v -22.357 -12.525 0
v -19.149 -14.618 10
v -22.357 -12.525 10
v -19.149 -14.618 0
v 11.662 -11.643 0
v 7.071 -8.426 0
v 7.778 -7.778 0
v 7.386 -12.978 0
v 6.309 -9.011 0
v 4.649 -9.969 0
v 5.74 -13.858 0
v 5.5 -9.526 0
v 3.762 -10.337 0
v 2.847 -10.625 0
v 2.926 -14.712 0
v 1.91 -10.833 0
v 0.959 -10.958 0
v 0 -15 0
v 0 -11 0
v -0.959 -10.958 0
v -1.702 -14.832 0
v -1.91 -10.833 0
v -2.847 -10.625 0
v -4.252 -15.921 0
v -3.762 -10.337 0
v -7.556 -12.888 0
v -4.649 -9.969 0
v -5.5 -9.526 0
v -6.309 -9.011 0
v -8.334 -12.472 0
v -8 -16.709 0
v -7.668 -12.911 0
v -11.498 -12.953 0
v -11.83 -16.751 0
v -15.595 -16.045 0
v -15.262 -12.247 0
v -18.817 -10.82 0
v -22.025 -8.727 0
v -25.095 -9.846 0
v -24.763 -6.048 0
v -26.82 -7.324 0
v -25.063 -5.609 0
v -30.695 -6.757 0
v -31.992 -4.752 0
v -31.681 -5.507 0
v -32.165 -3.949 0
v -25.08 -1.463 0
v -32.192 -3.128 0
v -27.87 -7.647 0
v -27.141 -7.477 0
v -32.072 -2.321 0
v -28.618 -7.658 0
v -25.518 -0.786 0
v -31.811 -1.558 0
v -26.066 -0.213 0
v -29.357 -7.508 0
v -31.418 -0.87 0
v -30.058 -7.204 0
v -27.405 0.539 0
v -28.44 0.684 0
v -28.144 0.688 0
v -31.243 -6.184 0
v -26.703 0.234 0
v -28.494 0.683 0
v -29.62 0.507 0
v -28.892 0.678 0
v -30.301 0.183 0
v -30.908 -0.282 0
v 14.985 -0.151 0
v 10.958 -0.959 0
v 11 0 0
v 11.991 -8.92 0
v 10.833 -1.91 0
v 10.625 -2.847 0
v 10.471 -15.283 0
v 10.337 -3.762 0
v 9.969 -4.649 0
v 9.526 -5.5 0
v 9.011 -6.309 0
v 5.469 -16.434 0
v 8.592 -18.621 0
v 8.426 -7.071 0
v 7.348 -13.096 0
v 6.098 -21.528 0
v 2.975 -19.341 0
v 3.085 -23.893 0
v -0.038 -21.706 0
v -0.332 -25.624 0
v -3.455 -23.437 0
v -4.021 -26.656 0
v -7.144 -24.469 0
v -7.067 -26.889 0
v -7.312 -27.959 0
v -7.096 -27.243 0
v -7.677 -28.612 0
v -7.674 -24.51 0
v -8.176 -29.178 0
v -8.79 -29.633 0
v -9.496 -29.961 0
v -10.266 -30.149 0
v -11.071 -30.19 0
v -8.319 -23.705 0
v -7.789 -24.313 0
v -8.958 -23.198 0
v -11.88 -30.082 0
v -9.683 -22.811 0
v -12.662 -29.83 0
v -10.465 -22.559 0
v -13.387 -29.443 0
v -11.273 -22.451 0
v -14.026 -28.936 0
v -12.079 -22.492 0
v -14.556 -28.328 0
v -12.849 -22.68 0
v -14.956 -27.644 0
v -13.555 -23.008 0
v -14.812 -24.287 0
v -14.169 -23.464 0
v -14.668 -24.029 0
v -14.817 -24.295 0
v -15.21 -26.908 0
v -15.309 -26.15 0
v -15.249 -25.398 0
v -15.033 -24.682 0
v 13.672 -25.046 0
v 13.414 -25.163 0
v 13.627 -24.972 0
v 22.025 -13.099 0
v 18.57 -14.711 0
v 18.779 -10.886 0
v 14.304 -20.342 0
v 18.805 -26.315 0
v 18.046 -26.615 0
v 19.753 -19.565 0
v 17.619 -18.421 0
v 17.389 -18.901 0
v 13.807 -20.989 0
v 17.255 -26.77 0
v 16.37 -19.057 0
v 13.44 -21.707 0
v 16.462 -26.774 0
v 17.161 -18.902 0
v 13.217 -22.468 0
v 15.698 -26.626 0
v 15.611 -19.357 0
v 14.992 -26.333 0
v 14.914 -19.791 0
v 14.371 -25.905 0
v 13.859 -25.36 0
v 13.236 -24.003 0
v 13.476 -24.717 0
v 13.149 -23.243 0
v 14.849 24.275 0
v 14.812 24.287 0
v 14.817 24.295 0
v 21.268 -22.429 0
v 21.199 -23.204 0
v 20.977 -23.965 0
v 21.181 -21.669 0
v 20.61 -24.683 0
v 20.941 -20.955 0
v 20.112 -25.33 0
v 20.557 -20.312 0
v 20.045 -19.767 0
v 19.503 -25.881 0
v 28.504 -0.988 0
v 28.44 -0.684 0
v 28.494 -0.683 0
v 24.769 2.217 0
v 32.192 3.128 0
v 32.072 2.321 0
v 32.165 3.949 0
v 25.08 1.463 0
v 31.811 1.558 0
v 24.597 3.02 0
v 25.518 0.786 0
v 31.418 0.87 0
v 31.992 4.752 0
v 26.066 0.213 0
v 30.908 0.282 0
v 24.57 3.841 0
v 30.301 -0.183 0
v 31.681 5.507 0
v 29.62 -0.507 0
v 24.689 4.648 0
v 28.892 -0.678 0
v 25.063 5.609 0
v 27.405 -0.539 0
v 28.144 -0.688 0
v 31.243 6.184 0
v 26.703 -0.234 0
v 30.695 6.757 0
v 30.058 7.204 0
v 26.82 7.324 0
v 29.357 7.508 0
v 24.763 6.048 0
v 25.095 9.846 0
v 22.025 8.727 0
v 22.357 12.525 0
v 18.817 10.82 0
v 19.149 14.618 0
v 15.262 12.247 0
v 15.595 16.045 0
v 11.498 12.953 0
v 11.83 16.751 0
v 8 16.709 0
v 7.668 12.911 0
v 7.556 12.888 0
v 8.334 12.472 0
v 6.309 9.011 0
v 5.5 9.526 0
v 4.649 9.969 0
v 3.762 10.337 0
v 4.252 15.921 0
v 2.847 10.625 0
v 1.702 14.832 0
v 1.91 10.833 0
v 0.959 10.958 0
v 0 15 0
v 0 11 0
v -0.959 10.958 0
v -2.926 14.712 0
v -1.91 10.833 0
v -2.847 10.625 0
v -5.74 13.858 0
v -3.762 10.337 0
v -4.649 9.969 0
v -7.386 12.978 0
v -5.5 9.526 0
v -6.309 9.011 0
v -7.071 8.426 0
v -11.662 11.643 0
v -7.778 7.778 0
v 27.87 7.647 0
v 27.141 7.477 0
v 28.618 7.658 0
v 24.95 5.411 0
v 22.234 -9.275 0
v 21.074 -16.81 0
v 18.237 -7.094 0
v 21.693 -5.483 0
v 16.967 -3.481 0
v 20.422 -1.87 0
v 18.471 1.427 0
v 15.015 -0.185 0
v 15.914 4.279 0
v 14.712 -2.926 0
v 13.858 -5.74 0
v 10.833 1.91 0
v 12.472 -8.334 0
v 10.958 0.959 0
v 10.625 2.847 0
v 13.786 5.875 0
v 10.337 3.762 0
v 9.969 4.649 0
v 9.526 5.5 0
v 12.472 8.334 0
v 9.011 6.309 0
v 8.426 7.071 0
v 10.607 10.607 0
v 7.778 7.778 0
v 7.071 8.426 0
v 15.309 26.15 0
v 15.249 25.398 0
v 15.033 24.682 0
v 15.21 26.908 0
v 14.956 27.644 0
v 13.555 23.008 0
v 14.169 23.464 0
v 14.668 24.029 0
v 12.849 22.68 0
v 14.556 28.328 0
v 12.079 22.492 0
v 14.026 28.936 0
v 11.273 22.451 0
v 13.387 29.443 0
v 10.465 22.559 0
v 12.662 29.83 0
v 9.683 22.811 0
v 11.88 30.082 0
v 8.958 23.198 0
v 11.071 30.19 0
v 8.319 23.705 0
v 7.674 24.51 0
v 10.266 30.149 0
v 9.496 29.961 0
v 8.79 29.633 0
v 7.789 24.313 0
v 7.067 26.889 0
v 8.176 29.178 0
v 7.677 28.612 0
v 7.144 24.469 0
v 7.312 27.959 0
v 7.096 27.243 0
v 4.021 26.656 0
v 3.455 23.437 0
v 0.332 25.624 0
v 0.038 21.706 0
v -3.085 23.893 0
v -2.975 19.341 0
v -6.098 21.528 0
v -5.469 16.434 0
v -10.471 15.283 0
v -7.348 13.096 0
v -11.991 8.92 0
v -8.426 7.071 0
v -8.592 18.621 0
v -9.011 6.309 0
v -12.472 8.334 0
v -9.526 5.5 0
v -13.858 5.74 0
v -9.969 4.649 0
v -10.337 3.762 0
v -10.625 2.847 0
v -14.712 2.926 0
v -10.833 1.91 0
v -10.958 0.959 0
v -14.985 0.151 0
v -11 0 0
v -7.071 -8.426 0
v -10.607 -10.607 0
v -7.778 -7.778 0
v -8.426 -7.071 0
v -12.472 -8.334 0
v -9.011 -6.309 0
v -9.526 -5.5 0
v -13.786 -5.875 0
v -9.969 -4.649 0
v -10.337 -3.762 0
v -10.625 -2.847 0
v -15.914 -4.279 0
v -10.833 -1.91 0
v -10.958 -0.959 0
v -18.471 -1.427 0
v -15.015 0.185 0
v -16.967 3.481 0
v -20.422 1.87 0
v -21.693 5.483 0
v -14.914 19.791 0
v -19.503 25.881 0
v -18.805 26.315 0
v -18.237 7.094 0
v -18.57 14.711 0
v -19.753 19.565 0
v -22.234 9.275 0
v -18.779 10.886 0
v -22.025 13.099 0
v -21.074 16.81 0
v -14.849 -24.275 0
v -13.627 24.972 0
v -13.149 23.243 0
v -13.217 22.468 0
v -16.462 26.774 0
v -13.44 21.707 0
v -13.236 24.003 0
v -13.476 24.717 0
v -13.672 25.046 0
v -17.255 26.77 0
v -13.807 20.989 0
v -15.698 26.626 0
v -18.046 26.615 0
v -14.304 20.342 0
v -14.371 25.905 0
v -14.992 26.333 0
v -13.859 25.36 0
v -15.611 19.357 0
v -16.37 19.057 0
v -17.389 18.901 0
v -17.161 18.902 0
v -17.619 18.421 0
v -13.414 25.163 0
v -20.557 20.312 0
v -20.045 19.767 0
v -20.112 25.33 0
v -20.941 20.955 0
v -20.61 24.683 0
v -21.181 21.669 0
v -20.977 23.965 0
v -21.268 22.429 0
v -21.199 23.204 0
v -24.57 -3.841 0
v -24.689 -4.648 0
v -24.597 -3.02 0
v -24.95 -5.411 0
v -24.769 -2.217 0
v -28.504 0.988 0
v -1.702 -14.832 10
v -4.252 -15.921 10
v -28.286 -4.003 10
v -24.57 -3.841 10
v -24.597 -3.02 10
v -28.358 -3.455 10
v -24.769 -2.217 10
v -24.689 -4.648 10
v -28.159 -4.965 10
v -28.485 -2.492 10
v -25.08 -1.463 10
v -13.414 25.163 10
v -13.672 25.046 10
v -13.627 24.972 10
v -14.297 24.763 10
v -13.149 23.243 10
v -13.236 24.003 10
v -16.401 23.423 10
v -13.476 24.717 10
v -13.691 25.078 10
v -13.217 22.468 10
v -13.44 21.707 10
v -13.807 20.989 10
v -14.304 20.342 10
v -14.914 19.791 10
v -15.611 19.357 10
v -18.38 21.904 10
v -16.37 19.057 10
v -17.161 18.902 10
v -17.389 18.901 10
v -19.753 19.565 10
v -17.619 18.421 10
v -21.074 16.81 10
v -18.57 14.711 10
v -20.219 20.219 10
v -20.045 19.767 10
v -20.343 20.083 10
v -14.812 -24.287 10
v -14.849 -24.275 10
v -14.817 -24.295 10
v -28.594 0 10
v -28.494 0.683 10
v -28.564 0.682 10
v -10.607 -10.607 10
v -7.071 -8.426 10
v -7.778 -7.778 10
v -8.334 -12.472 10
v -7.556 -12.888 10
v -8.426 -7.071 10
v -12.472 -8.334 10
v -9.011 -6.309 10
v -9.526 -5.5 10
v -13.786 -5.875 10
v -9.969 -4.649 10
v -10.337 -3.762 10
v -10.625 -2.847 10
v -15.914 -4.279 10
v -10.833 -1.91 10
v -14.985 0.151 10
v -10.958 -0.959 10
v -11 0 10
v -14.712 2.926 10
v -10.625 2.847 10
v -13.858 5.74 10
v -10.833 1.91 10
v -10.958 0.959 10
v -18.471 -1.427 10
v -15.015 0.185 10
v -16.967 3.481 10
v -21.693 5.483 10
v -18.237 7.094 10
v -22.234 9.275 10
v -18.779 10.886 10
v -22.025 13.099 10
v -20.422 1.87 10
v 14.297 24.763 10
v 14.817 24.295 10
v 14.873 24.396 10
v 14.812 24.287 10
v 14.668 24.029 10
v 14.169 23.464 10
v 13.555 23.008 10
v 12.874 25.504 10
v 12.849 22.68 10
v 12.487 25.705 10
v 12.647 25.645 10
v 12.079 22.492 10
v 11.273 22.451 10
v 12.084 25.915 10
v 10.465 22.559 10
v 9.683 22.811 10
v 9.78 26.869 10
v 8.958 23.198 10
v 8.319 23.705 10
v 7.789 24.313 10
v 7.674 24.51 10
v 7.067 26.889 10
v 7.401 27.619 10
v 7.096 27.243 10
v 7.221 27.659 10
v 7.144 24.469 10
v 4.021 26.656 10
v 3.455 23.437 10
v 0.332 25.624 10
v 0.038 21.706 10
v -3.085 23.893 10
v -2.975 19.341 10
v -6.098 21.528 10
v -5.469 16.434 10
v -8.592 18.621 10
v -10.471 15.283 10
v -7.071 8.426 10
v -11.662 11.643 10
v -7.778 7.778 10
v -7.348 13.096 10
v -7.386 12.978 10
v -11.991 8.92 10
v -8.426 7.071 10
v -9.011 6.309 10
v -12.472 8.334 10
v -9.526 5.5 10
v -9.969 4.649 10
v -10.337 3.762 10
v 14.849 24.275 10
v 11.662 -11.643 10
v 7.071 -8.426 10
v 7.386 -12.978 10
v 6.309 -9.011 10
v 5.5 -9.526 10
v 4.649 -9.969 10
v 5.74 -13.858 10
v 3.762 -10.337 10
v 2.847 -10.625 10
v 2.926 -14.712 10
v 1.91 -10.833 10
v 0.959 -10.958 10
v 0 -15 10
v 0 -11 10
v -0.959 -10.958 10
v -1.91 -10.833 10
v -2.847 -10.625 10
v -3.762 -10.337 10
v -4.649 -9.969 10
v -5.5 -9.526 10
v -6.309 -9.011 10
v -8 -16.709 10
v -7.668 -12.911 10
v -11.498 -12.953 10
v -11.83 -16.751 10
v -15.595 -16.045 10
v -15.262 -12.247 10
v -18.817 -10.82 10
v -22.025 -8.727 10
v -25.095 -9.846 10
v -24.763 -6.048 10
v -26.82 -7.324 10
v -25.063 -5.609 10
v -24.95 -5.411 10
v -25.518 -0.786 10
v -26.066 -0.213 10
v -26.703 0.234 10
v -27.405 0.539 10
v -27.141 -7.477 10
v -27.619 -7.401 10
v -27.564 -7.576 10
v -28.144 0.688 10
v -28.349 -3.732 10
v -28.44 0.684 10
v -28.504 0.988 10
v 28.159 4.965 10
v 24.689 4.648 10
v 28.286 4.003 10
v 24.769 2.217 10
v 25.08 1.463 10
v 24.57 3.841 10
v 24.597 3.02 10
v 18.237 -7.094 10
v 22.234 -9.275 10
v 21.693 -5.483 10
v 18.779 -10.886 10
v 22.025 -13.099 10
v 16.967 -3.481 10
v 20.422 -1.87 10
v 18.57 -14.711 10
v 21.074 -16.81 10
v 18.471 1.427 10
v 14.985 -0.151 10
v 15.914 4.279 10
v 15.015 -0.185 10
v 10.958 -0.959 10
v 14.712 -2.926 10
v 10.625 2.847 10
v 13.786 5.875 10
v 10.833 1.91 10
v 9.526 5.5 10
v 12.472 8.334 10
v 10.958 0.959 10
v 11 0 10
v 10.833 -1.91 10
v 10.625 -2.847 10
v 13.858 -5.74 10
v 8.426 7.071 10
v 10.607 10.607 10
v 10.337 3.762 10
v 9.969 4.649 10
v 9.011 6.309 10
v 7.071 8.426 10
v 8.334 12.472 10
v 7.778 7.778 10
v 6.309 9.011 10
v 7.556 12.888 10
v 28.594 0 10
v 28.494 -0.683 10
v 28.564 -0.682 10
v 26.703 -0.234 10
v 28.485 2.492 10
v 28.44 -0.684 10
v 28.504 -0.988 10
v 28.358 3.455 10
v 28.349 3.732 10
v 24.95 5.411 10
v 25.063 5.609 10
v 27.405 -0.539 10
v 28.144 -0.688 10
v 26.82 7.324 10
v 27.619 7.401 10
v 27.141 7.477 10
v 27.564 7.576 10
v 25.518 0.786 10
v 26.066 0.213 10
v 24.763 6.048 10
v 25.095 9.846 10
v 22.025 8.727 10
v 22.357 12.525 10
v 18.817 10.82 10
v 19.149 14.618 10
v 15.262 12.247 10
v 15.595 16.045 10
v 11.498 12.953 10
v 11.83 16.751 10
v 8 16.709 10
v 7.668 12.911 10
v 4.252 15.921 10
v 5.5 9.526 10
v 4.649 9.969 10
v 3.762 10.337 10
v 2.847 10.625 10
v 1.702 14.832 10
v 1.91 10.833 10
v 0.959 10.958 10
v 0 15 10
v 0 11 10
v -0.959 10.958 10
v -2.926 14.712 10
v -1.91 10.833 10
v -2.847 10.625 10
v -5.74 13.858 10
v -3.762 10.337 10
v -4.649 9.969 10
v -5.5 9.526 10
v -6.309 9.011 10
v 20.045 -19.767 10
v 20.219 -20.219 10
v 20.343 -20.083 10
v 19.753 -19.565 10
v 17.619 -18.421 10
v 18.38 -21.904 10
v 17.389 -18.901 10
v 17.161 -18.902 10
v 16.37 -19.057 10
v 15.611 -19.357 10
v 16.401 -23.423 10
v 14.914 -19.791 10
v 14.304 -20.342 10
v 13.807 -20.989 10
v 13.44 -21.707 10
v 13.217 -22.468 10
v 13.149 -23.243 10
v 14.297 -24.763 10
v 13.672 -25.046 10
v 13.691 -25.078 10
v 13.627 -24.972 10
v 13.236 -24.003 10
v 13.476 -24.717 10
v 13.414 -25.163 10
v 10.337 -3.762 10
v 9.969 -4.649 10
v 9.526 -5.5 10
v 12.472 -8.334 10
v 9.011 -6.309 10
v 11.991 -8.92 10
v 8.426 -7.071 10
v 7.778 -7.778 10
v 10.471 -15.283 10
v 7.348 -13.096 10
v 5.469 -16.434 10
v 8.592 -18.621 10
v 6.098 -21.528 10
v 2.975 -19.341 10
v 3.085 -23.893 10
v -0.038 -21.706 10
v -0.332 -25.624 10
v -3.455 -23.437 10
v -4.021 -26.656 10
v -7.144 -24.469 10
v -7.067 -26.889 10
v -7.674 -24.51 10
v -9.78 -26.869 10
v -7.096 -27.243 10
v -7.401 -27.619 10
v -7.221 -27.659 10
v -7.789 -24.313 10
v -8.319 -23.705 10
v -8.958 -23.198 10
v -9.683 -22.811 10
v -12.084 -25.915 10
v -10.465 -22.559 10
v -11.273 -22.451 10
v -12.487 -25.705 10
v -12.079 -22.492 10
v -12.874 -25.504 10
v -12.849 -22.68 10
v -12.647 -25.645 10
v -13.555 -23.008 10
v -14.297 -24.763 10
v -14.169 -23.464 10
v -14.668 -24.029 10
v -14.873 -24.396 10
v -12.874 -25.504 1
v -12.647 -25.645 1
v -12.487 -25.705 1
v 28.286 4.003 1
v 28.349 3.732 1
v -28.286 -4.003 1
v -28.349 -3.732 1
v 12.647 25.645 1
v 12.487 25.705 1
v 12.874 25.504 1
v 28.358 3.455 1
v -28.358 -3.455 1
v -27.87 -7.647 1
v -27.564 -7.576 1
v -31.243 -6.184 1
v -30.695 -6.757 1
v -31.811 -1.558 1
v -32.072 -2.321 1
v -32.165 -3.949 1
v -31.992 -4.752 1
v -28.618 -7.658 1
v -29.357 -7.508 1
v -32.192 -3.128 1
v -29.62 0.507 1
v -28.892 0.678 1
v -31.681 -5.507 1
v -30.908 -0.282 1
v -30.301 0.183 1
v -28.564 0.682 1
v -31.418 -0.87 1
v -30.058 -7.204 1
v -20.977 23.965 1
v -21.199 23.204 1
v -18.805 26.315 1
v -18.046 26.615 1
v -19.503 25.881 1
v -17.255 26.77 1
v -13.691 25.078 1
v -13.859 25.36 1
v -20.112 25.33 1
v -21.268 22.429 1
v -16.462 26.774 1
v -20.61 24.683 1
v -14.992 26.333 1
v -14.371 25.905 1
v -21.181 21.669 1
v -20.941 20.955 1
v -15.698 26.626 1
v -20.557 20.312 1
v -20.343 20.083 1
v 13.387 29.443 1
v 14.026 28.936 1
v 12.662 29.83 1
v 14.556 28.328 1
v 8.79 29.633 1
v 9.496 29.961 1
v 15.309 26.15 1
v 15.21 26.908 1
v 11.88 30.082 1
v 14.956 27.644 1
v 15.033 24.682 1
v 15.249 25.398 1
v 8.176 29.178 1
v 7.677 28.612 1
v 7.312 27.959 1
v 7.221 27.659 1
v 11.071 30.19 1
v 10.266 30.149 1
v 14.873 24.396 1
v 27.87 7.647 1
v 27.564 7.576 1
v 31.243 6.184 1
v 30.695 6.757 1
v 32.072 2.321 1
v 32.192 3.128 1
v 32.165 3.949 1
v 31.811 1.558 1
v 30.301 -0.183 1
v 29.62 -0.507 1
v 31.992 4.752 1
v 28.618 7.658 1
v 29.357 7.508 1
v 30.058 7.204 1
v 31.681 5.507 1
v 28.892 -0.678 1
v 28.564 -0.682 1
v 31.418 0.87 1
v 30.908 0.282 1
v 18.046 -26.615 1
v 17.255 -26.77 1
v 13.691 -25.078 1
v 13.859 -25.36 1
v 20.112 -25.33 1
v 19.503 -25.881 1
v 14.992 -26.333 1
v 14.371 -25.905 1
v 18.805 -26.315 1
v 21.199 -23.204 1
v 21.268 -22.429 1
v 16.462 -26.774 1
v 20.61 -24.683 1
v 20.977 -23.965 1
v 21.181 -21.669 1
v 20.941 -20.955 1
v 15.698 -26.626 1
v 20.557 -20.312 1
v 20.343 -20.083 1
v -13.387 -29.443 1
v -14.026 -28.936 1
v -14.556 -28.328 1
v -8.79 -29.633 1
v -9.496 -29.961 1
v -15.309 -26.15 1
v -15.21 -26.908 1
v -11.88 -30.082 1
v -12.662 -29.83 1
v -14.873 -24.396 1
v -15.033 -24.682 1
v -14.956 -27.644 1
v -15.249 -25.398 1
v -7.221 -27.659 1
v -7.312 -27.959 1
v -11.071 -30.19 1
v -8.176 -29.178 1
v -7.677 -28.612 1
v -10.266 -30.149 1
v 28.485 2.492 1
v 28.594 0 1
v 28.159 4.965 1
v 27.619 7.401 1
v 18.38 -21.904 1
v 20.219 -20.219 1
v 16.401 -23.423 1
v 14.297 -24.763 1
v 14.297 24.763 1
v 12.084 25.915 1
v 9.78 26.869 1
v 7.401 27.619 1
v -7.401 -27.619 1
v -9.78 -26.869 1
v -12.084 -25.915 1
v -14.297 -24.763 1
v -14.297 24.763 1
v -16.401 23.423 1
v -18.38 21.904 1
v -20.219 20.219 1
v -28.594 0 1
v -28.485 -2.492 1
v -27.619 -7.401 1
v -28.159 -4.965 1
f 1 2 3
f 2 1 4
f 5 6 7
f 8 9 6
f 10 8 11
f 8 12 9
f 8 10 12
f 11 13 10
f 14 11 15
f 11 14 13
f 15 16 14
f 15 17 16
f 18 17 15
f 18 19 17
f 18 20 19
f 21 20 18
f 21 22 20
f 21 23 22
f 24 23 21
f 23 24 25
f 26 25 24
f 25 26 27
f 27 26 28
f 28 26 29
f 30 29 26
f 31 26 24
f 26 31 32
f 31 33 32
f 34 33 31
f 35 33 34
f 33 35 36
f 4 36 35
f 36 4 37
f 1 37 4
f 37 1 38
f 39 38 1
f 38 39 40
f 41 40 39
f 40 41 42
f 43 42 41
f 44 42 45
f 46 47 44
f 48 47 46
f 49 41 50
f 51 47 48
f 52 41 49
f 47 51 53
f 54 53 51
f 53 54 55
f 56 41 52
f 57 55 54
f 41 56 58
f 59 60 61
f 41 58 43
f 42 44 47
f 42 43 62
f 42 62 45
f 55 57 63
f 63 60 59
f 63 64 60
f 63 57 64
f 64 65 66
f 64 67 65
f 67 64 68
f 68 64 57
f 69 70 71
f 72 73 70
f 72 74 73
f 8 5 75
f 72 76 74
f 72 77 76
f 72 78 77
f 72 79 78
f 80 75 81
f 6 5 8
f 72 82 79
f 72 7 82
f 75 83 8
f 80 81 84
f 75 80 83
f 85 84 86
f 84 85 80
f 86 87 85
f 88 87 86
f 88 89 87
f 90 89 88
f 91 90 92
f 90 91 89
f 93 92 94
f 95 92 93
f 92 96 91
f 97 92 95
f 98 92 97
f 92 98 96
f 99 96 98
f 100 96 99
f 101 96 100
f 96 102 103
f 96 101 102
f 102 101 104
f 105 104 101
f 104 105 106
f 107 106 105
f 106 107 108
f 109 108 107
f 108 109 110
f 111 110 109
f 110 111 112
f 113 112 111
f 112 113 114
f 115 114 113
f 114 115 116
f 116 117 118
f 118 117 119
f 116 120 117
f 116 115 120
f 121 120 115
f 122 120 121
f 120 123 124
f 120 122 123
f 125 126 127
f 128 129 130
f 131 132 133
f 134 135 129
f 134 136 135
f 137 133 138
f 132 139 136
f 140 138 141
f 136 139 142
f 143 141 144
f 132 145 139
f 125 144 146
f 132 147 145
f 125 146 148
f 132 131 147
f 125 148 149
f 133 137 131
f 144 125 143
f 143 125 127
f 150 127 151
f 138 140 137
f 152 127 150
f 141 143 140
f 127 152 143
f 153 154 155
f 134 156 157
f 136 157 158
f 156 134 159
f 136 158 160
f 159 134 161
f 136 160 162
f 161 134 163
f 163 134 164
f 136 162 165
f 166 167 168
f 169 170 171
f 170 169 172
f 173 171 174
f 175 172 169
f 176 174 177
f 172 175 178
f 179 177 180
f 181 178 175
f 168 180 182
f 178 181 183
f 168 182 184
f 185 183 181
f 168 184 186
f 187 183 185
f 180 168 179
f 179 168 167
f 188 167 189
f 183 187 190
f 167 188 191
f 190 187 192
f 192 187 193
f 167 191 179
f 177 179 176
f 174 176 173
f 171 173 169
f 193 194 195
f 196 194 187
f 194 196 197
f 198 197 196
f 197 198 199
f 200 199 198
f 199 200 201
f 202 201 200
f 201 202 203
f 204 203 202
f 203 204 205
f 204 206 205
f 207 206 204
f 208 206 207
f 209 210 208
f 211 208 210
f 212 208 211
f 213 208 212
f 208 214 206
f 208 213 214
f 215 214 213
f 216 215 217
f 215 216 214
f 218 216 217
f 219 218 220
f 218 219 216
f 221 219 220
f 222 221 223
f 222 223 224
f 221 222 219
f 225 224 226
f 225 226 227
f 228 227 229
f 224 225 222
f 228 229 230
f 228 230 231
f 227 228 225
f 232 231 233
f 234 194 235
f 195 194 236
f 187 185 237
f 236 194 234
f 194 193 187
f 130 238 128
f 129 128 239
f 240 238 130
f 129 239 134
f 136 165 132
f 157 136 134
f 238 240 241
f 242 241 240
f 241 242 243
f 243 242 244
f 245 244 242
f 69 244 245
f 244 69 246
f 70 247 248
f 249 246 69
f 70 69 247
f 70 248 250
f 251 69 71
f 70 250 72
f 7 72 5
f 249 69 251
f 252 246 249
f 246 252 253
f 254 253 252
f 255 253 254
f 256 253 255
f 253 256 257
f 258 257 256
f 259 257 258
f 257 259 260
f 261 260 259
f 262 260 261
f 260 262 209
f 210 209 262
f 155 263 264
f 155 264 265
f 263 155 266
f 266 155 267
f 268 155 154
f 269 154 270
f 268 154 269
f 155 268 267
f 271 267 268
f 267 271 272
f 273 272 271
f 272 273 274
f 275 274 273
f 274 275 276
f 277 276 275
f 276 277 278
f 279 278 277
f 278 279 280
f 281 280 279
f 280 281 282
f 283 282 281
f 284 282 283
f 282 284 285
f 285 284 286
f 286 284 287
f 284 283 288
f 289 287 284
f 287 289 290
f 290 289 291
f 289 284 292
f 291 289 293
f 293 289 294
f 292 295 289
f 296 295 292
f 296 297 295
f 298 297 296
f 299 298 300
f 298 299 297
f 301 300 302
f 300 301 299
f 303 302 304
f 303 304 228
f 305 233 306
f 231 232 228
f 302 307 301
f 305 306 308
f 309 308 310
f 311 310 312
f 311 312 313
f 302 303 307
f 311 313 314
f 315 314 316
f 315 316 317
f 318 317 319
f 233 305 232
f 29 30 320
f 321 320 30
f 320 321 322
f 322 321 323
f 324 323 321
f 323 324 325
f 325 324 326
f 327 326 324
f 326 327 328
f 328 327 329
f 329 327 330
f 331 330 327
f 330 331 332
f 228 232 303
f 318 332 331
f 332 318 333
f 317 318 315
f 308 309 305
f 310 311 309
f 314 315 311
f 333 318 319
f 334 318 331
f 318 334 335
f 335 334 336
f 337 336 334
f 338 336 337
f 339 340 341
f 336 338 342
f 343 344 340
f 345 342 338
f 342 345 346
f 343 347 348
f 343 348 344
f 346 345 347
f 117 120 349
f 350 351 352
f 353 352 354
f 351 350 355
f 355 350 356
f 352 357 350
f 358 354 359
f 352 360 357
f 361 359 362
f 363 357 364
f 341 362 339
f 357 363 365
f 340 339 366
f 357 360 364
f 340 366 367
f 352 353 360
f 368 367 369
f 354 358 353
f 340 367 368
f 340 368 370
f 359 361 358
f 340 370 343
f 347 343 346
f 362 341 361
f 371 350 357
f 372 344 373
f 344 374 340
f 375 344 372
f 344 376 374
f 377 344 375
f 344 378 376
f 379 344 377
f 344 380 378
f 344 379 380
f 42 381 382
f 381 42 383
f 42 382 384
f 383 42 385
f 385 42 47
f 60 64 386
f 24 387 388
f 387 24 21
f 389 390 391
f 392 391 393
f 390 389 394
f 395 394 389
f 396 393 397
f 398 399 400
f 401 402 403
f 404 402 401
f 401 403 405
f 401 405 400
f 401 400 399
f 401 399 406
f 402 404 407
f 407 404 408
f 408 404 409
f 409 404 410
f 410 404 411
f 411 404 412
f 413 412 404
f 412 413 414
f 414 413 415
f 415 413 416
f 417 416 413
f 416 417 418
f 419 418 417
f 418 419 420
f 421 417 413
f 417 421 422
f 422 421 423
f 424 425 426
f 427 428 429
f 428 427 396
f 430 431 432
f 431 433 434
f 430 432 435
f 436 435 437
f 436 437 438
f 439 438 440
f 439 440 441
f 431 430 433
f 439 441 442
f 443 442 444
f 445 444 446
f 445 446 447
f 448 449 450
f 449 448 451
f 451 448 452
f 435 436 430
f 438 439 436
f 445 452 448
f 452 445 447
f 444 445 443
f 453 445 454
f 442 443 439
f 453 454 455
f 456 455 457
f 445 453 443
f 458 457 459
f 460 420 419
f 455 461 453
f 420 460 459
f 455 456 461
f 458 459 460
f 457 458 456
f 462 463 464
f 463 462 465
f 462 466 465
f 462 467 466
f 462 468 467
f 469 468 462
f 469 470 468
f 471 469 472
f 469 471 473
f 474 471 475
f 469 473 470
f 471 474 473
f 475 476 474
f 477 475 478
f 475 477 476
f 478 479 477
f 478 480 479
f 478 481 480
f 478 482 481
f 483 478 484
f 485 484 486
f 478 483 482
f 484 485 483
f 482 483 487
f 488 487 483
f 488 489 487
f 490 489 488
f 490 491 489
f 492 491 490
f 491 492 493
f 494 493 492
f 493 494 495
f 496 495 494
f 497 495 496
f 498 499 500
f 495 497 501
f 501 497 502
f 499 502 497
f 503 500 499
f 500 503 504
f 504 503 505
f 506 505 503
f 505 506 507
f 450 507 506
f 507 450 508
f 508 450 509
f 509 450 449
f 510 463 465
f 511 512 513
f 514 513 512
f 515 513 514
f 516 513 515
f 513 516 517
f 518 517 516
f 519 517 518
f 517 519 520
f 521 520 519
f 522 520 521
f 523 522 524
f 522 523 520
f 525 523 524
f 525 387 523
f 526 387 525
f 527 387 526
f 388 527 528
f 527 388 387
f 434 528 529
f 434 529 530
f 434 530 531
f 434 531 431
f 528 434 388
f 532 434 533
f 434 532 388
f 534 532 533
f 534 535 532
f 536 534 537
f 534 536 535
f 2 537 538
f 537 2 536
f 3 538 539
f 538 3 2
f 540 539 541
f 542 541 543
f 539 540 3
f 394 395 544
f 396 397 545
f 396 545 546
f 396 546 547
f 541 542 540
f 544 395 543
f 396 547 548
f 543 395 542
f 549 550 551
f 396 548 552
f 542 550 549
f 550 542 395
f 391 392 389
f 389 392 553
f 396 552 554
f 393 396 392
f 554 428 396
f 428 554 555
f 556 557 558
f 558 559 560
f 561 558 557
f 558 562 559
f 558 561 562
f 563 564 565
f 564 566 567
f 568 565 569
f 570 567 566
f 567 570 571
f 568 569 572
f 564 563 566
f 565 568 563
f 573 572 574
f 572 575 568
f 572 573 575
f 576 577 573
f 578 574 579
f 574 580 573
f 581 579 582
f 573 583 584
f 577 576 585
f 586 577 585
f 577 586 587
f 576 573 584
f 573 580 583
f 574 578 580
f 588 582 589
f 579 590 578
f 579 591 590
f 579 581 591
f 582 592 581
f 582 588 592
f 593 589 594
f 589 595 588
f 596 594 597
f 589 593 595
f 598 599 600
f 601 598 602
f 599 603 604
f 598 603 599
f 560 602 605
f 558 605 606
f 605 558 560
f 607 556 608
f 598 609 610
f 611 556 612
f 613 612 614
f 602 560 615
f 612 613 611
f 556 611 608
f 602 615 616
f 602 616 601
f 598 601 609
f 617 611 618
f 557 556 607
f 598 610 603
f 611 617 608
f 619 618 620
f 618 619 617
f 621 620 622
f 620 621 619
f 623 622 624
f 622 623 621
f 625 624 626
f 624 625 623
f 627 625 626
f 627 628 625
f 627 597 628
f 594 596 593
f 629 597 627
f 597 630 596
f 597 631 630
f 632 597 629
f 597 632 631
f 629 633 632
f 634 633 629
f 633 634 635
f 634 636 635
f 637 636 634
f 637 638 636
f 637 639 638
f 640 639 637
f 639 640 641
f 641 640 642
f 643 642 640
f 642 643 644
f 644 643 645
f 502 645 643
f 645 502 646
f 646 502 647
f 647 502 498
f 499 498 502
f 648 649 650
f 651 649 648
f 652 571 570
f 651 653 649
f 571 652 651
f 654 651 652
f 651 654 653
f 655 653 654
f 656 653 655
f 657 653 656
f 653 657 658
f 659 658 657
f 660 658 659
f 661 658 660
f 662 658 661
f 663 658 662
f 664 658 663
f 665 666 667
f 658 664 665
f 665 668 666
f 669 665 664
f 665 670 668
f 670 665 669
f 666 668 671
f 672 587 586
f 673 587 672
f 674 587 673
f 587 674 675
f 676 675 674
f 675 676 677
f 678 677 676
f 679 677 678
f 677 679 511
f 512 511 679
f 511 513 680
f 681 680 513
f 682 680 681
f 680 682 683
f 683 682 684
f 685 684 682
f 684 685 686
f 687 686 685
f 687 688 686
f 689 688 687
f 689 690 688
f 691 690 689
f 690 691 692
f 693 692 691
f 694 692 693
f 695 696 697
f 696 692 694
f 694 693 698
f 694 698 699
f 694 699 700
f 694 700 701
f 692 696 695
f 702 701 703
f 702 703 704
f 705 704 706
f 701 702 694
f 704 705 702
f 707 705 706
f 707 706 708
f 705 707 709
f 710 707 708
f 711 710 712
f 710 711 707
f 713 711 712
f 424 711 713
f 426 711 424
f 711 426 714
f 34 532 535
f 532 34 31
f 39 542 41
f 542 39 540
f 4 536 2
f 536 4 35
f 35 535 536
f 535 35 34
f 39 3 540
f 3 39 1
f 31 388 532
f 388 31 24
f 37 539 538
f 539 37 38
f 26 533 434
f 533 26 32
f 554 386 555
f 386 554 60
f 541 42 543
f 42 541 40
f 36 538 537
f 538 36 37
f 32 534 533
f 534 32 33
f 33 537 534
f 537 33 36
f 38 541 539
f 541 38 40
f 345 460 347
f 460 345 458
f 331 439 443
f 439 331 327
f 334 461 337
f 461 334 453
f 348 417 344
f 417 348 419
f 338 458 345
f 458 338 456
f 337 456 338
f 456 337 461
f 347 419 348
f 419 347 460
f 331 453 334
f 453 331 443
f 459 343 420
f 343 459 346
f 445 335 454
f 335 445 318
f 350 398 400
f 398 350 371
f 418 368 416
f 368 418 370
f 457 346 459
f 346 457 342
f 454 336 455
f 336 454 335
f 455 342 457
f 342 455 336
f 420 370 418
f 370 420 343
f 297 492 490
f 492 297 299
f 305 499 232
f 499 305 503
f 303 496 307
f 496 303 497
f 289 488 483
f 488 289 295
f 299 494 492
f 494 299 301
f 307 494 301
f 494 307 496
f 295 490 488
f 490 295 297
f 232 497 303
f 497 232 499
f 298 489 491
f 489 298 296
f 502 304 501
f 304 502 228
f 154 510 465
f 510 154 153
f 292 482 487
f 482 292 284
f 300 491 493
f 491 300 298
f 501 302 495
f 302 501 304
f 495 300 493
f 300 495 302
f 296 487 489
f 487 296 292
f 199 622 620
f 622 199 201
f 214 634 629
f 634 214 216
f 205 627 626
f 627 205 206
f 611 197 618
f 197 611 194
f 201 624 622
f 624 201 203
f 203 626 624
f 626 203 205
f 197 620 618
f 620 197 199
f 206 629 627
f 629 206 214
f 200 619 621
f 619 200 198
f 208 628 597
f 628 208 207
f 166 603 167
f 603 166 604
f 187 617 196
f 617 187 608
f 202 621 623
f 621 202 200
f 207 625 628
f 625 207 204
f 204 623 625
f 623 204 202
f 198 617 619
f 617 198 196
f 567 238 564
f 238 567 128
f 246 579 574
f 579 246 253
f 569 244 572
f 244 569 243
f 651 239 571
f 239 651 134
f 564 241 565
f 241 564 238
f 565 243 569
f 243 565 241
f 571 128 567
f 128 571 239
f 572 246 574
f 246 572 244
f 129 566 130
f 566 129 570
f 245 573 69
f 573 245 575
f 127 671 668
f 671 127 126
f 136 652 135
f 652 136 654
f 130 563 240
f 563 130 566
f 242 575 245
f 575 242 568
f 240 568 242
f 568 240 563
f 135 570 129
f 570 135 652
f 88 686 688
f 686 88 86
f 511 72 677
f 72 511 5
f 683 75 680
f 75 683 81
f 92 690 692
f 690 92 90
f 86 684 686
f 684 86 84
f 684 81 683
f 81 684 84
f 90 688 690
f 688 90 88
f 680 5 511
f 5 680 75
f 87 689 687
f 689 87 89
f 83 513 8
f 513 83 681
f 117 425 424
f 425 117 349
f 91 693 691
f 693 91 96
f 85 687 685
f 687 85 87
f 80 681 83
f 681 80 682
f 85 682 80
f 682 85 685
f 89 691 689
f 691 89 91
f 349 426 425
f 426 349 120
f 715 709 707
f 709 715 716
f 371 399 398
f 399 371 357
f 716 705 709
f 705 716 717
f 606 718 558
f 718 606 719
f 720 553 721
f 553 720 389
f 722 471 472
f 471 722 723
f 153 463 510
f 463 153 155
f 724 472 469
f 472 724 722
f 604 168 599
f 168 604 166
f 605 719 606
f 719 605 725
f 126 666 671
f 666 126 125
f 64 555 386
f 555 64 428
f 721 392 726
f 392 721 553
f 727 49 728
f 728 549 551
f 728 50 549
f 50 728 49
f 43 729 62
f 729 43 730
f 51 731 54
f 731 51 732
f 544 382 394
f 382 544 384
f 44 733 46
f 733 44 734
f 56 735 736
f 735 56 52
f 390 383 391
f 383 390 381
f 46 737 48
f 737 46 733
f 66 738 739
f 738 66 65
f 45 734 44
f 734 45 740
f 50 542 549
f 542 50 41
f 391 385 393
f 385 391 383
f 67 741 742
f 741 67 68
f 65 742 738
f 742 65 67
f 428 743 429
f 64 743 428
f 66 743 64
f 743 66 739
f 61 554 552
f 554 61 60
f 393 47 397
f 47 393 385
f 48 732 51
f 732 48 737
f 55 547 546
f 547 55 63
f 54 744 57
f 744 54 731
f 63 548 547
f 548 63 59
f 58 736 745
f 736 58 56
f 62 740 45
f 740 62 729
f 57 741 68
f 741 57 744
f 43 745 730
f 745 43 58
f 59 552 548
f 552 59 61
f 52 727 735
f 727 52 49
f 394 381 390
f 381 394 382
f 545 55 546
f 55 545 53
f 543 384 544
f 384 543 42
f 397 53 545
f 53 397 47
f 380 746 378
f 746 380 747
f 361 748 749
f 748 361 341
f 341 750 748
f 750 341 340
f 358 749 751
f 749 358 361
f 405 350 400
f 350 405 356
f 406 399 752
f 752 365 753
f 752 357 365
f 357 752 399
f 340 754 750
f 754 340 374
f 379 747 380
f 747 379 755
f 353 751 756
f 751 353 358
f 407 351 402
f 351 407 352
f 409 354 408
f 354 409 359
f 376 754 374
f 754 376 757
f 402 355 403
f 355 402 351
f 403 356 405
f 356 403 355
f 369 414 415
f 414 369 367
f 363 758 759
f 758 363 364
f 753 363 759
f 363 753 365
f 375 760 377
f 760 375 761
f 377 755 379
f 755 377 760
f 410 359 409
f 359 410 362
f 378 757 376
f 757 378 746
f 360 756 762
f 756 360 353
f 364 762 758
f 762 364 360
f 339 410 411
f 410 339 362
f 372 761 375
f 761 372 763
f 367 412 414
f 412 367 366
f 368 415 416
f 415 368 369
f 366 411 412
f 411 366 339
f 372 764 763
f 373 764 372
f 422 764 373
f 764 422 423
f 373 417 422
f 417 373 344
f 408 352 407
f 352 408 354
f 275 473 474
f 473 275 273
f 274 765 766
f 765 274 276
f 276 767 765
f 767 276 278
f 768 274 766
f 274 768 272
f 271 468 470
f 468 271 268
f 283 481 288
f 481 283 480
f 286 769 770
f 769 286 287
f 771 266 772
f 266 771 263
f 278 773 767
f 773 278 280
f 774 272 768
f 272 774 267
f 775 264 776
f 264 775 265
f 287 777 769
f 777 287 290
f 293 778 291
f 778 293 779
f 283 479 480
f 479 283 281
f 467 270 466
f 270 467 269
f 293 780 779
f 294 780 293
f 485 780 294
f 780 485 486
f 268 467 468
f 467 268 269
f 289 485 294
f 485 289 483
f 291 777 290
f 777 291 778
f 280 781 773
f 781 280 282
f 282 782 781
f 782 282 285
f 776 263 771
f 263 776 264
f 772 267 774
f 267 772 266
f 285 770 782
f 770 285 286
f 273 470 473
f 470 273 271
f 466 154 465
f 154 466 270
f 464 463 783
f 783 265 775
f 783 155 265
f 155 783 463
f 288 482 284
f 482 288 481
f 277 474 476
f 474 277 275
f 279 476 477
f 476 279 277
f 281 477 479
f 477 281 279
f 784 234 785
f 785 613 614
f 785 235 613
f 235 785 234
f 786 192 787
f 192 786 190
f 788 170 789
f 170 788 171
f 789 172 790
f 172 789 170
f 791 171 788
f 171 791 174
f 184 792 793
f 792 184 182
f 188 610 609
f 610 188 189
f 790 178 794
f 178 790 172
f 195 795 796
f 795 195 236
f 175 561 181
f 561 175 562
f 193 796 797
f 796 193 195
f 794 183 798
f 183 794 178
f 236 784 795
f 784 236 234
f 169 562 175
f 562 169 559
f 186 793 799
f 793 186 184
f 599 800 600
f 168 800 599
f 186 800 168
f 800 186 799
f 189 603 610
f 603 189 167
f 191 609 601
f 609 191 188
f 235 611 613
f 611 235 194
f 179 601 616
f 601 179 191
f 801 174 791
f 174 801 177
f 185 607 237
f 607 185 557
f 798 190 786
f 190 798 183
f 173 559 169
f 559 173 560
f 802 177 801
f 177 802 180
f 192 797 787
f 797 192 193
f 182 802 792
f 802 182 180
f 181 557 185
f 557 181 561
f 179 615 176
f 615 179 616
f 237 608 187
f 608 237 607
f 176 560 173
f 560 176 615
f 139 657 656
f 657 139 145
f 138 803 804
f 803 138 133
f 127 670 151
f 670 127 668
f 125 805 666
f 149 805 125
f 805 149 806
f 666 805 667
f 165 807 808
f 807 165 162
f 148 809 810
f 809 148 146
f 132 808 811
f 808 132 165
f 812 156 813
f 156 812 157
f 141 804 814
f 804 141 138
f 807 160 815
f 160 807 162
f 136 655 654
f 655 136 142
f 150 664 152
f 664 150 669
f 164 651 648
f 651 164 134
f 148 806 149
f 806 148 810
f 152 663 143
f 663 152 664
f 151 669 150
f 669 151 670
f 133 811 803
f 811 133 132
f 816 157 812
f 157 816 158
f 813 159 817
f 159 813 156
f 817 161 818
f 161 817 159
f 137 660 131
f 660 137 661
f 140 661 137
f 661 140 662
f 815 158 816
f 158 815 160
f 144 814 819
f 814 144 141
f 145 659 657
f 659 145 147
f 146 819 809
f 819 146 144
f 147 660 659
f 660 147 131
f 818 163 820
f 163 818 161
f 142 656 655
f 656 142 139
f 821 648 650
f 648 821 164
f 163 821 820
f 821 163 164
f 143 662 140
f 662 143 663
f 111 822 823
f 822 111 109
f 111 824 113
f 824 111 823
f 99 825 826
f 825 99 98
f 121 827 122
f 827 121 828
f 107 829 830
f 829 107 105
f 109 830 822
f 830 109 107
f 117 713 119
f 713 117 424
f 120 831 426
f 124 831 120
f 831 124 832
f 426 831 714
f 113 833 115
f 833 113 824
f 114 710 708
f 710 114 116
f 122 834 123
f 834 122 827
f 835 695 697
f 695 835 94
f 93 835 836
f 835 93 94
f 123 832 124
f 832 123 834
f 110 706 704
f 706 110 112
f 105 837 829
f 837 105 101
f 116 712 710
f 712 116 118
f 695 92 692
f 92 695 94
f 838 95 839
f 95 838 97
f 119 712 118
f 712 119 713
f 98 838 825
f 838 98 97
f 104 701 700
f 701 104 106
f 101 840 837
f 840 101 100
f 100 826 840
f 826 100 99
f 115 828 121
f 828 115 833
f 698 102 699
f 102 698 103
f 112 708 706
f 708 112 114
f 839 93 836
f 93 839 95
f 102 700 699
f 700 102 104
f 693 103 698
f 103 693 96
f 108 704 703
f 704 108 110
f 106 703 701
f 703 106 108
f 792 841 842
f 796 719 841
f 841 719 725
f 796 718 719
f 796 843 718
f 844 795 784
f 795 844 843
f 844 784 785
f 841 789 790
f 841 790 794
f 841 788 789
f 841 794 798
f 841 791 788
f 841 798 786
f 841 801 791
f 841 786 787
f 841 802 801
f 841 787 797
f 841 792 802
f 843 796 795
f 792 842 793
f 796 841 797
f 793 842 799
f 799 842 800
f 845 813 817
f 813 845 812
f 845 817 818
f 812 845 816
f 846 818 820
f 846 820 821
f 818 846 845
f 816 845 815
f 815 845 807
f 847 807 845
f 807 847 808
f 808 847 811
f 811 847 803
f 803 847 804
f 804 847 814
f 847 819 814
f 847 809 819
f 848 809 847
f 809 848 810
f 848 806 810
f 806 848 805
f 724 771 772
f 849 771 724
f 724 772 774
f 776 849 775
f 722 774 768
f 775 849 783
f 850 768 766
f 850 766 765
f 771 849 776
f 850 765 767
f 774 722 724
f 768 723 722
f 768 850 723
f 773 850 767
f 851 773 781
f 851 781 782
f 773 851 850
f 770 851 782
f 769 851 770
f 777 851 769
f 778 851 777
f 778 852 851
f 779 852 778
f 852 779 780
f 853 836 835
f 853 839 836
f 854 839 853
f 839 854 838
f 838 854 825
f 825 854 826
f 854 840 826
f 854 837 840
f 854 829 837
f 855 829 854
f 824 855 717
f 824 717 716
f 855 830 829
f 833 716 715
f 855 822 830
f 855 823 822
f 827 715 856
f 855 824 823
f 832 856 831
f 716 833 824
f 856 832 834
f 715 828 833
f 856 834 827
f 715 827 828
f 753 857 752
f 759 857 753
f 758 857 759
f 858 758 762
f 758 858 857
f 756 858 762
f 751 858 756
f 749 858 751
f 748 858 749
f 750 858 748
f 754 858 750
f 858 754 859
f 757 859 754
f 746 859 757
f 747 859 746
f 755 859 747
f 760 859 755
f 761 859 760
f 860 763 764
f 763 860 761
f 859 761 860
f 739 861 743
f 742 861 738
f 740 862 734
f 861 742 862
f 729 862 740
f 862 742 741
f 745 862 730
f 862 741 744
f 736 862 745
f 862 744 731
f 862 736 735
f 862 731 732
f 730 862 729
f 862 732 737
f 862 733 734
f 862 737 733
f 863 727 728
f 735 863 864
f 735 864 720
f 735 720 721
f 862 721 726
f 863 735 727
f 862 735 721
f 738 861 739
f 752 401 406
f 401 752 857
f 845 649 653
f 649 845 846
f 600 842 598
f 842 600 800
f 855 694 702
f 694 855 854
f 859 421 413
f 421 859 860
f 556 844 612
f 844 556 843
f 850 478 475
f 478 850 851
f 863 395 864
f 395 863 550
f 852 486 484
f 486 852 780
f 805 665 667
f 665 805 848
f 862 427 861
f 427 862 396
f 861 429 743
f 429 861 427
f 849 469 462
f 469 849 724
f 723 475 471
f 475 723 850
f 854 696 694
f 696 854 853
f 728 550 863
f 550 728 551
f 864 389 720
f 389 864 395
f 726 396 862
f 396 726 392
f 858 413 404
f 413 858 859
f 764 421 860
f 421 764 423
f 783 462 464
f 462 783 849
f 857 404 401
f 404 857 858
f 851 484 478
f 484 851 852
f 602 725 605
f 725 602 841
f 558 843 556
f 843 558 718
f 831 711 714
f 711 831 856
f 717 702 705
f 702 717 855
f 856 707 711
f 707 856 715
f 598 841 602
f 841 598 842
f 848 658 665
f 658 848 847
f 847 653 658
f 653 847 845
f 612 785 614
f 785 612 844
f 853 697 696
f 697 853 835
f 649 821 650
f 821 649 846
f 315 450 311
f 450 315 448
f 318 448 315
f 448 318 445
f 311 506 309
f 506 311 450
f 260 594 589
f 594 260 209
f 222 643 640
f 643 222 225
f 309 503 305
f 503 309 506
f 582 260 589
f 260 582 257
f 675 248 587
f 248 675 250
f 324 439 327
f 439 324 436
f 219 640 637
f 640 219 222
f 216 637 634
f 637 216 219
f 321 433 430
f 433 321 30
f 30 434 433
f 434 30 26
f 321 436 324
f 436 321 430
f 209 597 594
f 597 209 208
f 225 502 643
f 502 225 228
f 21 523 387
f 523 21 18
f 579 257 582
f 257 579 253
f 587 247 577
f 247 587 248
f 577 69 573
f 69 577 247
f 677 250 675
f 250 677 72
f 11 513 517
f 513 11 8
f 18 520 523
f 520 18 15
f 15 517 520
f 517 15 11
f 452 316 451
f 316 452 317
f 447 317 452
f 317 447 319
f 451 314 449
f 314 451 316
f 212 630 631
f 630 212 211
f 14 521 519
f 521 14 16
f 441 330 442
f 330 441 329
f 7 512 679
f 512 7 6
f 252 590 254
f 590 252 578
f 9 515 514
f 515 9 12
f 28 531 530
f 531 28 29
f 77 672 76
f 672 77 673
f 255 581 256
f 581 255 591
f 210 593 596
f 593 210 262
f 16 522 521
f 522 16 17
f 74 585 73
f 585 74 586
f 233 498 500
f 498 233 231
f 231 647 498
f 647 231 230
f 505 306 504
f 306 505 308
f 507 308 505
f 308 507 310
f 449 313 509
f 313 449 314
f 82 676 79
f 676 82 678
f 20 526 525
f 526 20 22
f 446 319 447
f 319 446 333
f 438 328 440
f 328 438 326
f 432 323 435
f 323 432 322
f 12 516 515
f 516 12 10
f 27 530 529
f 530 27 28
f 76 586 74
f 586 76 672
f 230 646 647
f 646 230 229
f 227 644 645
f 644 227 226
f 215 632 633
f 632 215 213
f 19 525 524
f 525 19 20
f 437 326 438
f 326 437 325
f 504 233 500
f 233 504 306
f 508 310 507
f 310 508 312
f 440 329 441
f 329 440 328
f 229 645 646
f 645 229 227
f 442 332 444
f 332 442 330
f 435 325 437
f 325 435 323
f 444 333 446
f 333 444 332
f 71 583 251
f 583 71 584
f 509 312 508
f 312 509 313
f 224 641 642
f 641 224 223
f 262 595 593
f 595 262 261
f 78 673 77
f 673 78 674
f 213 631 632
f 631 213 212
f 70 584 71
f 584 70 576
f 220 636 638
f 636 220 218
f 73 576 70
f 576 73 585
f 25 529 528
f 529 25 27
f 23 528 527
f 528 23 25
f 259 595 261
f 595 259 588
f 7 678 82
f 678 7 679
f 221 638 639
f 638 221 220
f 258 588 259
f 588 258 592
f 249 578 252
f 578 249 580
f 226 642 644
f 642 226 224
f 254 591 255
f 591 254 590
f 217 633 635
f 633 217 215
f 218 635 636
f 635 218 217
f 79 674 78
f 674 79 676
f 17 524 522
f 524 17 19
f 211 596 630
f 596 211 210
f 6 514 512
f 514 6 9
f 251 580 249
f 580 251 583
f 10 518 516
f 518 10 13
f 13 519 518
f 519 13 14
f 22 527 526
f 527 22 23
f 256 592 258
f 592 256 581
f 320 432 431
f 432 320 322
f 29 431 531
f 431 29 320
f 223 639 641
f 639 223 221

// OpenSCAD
// Diameter of the spool hole in mm (where the spool holder will fit)
spool_hole_diameter=57; 

// Height of the spool holder in mm
height=10; 

// Diameter of the inner hold of the spool holder in mm (where the bearing is placed)
bearing_diameter=22;

// Spool holder inner ring thickness in mm
inner_ring_thickness=4; 


number_of_arms=6;

// Arms thickness in mm
arms_thickness=4; 

// Which side do you want to print?
side=1; // [0:Left, 1:Right]


module ring(r0, r1, h=5, center=false, $fn=32) {
    difference()
    {
        cylinder(r=r1, h=h, center=center);
        translate([0, 0, -h/2]) {
            cylinder(r=r0, h=h*4, center=center);
        }
    }
}

module half_moon(r0=10, r1=10, r2=0, offset=10, h=10, center=false, $fn=32) {
    difference() {
        cylinder(r=r0, h=h, center=center);
        translate([offset,0,-h/2])
        cylinder(r=r1, h=h*4, center=center);
        translate([0,r2,-h/2])
        cylinder(r=r2, h=h*4, center=center);
    }
}

module arms(h=10, ath=3, n=6, $fn=32) {
    rotate([0,0,15]) {
        difference() {
            for (i=[0:n]) {
                rotate([0,0,360/n*i])
                translate([11,0,0]) 
                rotate([0,0,80]) {
                    half_moon(r0=20.5,r1=20.5, r2=0, h=h, offset=ath);
                }
            }
            translate([0,0,-3])
            ring(r0=30, r1=50, h=h*2);
        }
        difference() {
            for (i=[0:n]) {
                rotate([0,0,360/n*i-22 ])
                translate([30,0,0])
                scale([1,1.1,1])
                cylinder(r=4, h=h);
            }
            translate([0,0,1])
            ring(r0=30, r1=50, h=h, $fn=72);
        }
    }

}

module spool_holder(d=60,h=10, ir=11+0.2, rth=5, ath, $fn=32) {
    difference() {
        union() {
            cylinder(r=ir+rth,h=h);
            scale([(d+4)/64,(d+4)/64,1]) arms(h=h, ath=ath, n=number_of_arms);
        }
        translate([0,0,-h/2])
        cylinder(r=ir,h=h*2, $fn=72);

    }
}



mirror([side,0,0]) {
    spool_holder(d=spool_hole_diameter, h=height, ir=bearing_diameter/2, rth=inner_ring_thickness, ath=arms_thickness);
}
